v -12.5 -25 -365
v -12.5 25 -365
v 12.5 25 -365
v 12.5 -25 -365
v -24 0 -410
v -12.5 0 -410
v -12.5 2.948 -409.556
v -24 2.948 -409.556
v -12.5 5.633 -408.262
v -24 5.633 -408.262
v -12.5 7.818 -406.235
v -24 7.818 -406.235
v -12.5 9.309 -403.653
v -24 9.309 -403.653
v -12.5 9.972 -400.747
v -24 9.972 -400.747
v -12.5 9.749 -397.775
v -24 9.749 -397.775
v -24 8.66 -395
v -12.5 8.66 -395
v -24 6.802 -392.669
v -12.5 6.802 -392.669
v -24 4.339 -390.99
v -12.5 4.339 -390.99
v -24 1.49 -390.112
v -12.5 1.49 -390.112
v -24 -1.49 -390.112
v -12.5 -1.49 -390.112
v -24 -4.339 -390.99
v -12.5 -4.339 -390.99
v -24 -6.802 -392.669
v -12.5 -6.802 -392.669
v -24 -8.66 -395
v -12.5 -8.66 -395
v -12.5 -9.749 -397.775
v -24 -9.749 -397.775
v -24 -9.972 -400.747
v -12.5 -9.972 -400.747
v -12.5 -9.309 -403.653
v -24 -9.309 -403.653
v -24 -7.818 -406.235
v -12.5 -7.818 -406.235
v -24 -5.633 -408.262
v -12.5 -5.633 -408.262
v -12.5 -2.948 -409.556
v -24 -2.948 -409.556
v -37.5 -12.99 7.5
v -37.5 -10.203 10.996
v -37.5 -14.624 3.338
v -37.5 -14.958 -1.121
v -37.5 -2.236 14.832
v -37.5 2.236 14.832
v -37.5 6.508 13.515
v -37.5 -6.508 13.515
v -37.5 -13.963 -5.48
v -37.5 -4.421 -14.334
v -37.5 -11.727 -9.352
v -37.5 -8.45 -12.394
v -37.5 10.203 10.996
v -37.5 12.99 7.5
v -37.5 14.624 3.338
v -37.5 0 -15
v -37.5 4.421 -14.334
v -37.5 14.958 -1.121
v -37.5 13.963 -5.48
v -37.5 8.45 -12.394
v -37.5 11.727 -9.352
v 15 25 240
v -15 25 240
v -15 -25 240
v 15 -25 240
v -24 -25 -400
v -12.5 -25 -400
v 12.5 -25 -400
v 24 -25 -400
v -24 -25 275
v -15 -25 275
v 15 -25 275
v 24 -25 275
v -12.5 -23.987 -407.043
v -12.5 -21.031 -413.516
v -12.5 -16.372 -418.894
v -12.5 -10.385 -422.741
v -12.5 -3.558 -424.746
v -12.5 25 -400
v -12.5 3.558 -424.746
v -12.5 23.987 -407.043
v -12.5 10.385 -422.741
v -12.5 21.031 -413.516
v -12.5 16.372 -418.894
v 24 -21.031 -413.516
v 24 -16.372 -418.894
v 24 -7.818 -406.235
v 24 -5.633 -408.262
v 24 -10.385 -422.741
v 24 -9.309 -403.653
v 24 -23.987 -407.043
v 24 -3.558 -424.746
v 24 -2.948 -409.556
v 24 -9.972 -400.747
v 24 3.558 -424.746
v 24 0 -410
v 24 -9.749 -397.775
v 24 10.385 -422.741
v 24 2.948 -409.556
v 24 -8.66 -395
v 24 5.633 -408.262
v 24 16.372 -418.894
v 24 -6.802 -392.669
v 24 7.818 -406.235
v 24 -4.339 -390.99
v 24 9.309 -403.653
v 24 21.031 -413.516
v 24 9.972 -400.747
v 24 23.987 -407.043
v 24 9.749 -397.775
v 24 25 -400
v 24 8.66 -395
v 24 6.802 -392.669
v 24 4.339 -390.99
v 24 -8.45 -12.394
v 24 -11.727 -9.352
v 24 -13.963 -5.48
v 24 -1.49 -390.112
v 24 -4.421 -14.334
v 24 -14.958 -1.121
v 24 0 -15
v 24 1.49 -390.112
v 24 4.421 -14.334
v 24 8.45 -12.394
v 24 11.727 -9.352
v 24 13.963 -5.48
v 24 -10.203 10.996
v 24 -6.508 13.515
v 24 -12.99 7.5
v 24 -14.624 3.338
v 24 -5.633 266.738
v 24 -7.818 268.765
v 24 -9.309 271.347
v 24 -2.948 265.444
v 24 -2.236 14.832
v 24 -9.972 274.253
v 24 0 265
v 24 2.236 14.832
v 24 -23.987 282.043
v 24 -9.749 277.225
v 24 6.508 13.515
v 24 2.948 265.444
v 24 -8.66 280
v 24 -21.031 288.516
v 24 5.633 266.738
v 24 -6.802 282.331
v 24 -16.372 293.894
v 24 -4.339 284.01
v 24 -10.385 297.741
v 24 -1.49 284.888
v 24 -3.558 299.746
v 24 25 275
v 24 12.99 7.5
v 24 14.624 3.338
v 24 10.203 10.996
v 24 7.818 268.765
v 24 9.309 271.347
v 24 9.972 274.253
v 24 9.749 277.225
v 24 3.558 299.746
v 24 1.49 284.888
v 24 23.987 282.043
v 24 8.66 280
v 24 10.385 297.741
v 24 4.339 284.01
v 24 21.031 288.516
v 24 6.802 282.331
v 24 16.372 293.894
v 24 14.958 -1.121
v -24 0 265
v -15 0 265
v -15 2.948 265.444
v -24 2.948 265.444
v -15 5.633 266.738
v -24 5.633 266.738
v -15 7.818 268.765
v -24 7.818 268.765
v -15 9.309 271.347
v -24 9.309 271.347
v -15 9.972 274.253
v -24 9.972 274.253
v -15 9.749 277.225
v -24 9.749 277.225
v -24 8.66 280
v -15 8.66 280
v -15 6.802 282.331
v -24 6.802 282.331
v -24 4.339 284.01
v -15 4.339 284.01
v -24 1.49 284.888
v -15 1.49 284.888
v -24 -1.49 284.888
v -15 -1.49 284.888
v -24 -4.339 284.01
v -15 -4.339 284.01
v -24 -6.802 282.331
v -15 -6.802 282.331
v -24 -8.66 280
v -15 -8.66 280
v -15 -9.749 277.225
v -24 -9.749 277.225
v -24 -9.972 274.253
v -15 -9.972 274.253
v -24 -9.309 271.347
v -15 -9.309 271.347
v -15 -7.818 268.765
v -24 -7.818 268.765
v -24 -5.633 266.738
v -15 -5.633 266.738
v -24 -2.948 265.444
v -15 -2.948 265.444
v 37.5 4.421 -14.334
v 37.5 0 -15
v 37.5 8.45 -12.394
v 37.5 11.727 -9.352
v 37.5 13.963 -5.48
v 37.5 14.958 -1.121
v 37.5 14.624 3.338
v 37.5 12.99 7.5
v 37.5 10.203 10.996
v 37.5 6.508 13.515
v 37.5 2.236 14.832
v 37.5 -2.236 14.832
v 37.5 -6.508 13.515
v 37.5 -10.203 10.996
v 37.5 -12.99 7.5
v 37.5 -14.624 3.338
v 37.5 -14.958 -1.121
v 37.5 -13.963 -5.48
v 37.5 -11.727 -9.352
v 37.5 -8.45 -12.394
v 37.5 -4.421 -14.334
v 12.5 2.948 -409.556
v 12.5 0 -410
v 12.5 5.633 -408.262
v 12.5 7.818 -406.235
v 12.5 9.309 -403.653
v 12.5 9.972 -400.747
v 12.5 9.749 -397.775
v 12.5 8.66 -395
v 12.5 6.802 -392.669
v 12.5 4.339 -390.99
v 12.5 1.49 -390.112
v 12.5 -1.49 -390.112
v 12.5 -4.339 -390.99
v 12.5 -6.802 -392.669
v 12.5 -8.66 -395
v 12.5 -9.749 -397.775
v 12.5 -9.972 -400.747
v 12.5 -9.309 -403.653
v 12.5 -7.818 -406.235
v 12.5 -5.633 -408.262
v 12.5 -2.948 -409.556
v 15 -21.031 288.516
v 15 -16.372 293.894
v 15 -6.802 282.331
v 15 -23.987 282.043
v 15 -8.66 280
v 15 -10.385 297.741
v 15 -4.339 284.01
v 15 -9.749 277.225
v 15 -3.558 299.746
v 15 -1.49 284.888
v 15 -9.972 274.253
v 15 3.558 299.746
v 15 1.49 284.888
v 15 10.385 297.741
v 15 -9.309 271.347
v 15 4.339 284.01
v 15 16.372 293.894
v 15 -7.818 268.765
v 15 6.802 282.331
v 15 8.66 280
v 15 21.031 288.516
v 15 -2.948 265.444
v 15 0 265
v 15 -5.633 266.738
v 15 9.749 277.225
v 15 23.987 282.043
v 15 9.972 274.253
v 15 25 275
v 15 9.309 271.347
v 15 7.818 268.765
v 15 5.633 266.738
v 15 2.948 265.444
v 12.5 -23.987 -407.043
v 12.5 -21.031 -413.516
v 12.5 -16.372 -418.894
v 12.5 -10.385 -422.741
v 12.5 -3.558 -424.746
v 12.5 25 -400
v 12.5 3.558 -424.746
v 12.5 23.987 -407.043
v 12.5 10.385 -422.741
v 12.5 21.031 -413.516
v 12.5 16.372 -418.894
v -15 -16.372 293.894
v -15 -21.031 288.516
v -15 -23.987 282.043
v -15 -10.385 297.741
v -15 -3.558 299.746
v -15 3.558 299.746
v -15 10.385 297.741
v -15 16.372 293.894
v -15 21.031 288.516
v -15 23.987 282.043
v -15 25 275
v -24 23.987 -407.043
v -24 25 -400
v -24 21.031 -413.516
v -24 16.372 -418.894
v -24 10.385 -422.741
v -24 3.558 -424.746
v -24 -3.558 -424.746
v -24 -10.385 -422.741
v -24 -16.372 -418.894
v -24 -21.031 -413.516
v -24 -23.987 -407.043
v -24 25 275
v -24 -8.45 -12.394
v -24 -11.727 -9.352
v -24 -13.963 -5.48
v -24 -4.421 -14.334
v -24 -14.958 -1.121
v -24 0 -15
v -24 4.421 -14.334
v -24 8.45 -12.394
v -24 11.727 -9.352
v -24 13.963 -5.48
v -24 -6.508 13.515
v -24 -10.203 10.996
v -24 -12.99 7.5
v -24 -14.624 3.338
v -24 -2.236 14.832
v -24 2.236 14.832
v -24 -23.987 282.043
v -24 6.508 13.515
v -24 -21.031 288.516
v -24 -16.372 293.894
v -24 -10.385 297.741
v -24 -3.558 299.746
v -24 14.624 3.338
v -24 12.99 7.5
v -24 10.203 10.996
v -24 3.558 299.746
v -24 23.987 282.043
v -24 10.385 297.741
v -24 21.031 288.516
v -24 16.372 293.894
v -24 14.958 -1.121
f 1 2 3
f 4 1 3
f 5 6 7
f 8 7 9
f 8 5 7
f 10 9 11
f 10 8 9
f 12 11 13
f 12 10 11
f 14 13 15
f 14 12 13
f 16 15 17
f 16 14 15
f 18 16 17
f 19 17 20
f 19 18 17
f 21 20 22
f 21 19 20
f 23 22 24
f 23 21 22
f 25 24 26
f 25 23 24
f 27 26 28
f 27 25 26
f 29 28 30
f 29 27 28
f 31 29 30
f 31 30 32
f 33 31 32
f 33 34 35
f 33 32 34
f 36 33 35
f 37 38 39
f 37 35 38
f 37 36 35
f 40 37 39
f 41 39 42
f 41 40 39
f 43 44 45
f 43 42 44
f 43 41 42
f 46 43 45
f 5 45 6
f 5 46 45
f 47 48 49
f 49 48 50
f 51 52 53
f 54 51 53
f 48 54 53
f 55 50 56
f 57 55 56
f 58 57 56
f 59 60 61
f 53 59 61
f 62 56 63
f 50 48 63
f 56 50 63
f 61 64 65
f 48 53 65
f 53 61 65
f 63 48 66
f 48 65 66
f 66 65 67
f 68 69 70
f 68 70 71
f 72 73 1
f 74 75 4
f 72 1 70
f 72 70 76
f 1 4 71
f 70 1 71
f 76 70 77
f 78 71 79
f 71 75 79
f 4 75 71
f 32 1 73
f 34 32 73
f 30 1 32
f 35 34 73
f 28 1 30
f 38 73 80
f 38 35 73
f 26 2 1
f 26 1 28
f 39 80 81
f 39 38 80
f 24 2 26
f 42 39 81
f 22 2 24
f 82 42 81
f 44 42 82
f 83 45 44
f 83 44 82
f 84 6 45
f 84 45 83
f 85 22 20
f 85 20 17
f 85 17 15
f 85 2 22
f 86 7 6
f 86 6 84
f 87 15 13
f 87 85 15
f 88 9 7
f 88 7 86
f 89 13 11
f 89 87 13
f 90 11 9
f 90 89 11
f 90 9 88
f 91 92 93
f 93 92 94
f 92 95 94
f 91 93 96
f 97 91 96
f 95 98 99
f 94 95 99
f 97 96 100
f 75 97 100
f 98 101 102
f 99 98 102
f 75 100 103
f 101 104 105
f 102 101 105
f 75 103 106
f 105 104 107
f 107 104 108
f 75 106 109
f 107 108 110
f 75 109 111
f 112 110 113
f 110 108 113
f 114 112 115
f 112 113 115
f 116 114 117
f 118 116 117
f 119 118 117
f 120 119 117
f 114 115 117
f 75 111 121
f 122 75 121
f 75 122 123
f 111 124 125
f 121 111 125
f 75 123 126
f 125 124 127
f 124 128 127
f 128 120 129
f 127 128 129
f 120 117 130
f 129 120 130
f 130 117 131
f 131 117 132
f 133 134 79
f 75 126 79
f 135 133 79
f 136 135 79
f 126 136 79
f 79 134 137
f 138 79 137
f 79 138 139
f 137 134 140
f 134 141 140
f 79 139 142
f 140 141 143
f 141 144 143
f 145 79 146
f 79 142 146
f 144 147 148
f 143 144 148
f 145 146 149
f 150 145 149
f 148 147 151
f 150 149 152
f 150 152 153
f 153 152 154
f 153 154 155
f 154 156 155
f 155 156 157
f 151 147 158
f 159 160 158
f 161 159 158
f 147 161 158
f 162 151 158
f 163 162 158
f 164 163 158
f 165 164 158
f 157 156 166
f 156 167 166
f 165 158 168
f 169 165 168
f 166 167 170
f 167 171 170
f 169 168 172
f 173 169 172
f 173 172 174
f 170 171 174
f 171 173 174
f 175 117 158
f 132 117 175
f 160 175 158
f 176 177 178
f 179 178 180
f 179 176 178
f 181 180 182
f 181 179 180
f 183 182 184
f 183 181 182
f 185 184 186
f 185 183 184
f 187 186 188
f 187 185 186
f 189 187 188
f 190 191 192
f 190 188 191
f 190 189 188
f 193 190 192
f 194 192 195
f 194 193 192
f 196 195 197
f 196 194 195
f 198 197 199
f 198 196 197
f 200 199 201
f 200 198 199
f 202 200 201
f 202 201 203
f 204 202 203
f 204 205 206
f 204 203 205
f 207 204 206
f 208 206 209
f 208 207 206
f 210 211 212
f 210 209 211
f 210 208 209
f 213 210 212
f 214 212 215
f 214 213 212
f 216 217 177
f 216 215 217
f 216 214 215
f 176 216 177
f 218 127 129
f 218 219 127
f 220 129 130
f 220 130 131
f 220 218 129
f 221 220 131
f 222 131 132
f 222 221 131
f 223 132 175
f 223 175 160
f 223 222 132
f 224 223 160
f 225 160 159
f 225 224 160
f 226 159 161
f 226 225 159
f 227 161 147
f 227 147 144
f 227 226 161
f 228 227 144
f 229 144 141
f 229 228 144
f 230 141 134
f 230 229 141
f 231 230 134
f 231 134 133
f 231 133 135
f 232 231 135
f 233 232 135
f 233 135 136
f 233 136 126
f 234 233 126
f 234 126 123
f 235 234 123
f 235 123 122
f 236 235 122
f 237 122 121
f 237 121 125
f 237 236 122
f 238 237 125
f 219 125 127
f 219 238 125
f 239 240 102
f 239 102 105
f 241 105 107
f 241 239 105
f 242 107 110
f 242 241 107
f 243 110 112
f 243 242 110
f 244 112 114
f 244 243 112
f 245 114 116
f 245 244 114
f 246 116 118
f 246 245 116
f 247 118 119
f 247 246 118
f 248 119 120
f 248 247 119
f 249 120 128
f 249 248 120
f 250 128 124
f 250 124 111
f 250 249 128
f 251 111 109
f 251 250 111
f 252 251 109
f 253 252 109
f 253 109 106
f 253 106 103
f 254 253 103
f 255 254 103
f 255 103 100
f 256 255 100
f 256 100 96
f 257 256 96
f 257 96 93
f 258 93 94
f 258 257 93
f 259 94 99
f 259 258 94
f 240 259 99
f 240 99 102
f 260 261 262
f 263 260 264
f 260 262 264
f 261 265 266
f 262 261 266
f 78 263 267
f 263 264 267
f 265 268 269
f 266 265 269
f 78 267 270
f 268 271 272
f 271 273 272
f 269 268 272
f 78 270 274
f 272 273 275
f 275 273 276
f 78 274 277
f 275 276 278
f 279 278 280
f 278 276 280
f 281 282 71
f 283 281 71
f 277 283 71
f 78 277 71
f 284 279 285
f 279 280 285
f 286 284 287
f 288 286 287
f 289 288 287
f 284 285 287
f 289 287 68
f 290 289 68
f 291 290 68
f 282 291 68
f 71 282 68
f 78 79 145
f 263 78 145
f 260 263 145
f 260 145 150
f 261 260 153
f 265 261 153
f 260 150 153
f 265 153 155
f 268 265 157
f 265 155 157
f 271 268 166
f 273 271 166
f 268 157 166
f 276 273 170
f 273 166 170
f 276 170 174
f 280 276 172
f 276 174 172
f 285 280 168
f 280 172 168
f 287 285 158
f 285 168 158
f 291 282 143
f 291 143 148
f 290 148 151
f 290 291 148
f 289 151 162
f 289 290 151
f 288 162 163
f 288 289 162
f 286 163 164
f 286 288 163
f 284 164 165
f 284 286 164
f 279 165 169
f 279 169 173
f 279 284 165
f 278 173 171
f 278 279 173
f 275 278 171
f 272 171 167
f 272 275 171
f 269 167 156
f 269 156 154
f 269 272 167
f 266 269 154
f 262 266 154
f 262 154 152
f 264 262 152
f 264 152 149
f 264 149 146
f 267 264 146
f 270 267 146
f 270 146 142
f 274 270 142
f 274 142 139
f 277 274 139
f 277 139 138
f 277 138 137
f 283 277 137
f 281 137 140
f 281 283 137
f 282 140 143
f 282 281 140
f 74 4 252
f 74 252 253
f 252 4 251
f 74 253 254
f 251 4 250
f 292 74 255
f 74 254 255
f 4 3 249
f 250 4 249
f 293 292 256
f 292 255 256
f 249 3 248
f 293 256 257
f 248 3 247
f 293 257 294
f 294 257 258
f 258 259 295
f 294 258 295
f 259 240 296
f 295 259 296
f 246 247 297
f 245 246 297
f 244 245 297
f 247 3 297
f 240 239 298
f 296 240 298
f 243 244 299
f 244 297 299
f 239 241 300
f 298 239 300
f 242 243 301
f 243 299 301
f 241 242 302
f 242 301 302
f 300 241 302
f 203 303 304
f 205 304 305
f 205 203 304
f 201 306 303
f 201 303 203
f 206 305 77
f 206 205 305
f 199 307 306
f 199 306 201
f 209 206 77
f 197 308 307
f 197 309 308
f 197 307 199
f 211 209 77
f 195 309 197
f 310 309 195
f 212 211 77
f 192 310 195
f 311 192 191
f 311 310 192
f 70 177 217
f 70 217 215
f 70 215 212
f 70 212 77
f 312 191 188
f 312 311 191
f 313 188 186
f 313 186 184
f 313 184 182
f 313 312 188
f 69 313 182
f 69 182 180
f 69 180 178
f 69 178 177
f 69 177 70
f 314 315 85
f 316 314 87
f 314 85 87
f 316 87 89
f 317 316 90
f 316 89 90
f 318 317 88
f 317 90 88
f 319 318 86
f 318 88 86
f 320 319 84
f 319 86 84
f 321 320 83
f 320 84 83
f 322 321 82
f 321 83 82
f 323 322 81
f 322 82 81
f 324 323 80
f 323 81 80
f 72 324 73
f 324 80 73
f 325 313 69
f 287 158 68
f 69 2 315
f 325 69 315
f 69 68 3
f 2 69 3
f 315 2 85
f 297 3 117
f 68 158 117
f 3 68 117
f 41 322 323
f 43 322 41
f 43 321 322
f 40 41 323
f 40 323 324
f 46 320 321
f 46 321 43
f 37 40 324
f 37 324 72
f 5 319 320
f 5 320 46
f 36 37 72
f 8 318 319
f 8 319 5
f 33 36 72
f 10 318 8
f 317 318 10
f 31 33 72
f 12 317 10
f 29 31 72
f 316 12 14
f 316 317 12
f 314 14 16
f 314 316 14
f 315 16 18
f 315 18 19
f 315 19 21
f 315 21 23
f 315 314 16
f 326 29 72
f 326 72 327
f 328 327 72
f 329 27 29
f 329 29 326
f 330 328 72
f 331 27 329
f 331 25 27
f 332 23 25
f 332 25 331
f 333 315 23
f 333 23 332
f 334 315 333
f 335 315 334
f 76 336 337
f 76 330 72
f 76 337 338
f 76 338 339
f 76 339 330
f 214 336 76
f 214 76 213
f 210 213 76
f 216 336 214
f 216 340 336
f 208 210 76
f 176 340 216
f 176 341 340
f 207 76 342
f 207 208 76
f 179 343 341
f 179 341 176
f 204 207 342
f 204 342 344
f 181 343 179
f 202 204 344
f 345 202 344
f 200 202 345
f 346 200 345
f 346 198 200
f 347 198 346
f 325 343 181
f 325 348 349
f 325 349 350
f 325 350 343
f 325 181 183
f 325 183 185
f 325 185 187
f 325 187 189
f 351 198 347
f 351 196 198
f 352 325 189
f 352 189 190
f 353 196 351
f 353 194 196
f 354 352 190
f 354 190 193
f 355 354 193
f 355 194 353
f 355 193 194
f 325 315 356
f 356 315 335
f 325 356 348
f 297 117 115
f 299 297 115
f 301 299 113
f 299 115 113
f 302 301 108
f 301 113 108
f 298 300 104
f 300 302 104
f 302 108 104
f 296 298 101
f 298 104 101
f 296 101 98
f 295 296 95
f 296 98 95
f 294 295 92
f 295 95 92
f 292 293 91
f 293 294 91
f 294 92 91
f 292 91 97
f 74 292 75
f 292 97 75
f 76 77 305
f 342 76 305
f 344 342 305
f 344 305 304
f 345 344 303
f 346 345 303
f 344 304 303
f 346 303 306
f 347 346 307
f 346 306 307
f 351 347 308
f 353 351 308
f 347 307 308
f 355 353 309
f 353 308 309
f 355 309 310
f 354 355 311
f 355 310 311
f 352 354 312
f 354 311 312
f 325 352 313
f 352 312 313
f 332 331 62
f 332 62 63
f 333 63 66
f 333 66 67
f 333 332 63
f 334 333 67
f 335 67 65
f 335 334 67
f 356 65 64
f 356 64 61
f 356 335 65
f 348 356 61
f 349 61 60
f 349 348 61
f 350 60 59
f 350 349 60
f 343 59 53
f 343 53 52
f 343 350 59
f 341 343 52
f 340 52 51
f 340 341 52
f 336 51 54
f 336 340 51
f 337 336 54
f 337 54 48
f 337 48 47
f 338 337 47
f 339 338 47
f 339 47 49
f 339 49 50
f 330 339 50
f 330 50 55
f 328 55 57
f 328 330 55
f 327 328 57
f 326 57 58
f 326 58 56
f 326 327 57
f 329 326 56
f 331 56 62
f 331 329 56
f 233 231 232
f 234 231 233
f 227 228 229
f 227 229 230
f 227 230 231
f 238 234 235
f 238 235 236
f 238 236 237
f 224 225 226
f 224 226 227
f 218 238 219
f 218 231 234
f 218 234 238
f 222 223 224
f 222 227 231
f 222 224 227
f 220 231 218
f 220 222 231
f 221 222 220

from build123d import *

# Parameters (mm, degrees)
SKETCH1_R           = 10
BOSS_EXTRUDE1_DEPTH = 24
SKETCH2_W           = 25
SKETCH2_H           = 60
SKETCH2_W_2         = 30
CUT_EXTRUDE1_DEPTH  = 429.603546416
SKETCH3_R           = 15
BOSS_EXTRUDE2_DEPTH = 37.5


with BuildPart() as part:
    # Sketch1 → Boss-Extrude1 (new, symmetric)
    with BuildSketch(Plane(origin=(0, 0, 0), x_dir=(0, 0, -1), z_dir=(1, 0, 0))):
        with BuildLine():
            Line((-275, 25), (400, 25))
            ThreePointArc((400, 25), (425, 0), (400, -25))
            Line((400, -25), (-275, -25))
            ThreePointArc((-275, -25), (-300, 0), (-275, 25))
        make_face()
        with Locations((-275, 0)):
            Circle(SKETCH1_R, mode=Mode.SUBTRACT)
        with Locations((400, 0)):
            Circle(SKETCH1_R, mode=Mode.SUBTRACT)
    extrude(amount=BOSS_EXTRUDE1_DEPTH, both=True)

    # Sketch2 → Cut-Extrude1 (cut, through all)
    with BuildSketch(Plane(origin=(0, 25, 0), x_dir=(1, 0, 0), z_dir=(0, 1, 0))):
        with Locations((0, 395)):
            Rectangle(SKETCH2_W, SKETCH2_H)
        with Locations((0, -270)):
            Rectangle(SKETCH2_W_2, SKETCH2_H)
    extrude(amount=-CUT_EXTRUDE1_DEPTH, mode=Mode.SUBTRACT)

    # Sketch3 → Boss-Extrude2 (add, symmetric)
    with BuildSketch(Plane(origin=(0, 0, 0), x_dir=(0, 0, -1), z_dir=(1, 0, 0))):
        Circle(SKETCH3_R)
    extrude(amount=BOSS_EXTRUDE2_DEPTH, both=True)


solid = part.part
